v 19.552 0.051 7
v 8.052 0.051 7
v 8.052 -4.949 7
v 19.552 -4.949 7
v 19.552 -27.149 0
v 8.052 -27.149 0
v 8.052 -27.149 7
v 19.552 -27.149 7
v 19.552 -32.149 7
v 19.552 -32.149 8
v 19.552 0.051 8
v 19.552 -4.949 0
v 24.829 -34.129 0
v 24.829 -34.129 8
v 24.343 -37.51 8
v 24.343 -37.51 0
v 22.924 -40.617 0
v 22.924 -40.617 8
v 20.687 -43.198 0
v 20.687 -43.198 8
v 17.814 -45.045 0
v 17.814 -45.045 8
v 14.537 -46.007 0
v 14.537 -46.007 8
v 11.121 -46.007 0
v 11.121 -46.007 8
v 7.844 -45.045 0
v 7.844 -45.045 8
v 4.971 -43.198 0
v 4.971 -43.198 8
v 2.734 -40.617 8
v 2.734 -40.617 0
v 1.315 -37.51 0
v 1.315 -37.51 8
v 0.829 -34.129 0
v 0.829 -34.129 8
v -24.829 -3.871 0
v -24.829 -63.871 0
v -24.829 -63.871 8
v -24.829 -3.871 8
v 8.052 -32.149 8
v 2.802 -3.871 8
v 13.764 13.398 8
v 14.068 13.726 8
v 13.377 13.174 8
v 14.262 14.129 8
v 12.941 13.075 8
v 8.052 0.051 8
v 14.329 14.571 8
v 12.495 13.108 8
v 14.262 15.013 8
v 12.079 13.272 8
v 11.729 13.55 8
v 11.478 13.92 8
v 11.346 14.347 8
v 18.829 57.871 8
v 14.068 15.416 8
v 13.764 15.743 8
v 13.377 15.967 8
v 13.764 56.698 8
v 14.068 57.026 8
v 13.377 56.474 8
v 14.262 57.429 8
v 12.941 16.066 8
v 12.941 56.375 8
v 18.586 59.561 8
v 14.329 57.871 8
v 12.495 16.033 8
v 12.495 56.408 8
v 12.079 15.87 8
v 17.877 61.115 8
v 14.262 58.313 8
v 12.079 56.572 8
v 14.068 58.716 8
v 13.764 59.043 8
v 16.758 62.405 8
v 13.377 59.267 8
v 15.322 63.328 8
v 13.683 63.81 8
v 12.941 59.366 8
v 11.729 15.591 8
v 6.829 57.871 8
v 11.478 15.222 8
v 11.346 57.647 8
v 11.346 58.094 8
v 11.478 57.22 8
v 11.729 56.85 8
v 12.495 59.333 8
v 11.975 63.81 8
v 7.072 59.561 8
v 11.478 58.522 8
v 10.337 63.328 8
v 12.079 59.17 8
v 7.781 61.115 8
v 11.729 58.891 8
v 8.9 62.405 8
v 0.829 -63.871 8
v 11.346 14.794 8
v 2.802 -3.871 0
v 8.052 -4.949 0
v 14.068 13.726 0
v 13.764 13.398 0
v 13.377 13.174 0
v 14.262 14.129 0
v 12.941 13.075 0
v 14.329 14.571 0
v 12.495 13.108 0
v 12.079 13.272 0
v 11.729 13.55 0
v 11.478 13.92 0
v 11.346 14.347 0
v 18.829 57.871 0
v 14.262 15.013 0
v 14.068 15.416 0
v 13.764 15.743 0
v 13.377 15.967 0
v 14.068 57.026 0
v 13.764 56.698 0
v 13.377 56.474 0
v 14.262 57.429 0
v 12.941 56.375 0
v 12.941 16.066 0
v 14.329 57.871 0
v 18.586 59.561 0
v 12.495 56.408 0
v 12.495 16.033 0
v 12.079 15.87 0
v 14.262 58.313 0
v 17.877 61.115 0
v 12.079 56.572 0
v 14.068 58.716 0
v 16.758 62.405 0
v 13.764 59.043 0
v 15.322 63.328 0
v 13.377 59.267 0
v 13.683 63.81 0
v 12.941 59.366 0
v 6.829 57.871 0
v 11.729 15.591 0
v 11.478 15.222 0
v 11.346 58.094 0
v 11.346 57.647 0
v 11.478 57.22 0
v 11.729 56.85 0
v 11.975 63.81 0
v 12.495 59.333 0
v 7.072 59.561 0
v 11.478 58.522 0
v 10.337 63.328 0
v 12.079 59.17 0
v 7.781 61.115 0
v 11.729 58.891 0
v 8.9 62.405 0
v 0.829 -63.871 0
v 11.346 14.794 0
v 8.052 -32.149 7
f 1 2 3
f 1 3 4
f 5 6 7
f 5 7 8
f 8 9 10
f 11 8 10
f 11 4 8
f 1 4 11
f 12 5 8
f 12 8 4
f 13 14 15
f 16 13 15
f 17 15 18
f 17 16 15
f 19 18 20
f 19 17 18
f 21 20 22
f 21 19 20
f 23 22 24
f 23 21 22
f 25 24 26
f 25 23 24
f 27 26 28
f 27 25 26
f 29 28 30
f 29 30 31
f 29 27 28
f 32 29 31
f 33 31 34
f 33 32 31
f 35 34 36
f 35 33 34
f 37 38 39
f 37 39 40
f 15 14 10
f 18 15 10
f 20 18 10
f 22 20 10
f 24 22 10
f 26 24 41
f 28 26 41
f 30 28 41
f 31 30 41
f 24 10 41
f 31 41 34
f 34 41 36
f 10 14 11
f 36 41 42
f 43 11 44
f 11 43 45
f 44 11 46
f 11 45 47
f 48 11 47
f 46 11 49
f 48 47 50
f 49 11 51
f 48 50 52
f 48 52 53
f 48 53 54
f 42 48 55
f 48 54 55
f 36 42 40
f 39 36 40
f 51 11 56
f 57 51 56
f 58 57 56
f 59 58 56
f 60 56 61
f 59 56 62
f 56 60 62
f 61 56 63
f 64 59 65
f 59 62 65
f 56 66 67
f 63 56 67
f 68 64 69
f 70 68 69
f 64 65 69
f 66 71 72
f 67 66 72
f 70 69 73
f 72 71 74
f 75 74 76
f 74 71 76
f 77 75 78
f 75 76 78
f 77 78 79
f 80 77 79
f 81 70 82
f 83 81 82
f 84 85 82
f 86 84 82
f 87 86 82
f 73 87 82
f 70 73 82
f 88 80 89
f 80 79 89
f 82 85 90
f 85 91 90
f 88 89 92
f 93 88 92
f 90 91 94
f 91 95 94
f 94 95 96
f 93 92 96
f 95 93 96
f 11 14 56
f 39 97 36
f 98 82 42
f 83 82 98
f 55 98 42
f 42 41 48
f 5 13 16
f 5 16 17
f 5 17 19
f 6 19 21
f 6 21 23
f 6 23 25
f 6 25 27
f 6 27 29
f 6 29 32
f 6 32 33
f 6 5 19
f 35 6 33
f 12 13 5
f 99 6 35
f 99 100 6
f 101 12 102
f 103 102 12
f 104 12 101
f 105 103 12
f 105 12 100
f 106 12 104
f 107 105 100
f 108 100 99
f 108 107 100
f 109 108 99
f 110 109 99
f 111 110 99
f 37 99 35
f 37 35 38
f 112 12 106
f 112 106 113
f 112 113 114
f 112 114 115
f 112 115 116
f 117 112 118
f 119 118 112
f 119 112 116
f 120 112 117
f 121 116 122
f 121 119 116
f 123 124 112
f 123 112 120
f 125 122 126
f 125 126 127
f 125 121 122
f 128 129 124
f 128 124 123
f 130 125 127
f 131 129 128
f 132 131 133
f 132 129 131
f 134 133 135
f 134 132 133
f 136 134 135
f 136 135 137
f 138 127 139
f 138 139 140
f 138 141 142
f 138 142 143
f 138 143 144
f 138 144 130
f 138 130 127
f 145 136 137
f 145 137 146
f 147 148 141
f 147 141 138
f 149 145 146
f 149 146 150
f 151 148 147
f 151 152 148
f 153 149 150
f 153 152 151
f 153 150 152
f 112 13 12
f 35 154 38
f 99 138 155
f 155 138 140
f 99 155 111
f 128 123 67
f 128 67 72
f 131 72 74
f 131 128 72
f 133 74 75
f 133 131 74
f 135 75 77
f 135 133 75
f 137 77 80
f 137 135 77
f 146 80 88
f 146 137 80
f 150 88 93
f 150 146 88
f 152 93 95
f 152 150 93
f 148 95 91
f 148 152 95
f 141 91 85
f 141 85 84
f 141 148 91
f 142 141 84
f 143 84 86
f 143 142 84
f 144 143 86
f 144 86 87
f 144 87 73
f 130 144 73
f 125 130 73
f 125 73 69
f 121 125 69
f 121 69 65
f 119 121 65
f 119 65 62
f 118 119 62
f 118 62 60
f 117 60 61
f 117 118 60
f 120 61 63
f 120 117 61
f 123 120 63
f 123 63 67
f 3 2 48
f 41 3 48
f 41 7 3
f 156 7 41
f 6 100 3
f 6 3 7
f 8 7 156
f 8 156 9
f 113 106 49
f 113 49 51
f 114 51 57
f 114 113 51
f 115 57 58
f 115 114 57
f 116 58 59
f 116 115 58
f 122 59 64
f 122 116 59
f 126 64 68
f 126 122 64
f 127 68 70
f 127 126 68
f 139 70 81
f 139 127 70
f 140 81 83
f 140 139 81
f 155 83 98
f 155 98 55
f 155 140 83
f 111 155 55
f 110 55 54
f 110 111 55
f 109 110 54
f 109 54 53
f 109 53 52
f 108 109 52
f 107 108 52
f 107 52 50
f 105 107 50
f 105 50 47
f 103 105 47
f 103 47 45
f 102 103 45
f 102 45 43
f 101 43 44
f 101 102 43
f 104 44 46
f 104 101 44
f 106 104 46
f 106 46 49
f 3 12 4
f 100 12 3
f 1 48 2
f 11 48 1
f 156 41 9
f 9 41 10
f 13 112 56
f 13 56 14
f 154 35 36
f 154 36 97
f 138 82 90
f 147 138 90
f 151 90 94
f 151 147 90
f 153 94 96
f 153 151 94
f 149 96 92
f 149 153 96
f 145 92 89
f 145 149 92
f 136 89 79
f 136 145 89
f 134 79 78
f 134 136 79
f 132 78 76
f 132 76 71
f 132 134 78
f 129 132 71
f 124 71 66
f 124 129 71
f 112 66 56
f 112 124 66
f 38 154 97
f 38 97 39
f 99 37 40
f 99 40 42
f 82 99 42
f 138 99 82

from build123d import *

# Parameters (mm, degrees)
SKETCH1_R               = 1.5
BOSS_EXTRUDE1_DEPTH     = 8
CUT_EXTRUDE1_DEPTH      = 69.992355237
CUT_EXTRUDE1_DEPTH_BACK = 20
SKETCH2_W               = 11.5
SKETCH2_H               = 22.2
SKETCH2_3_W             = 11.5
SKETCH2_3_H             = 5
CUT_EXTRUDE2_DEPTH      = 1


with BuildPart() as part:
    # Sketch1 → Boss-Extrude1 (new body)
    with BuildSketch(Plane.XY):
        with BuildLine():
            Line((18.829016979, 57.870689655), (24.829016979, -34.129310345))
            ThreePointArc((24.829016979, -34.129310345), (12.829016979, -46.129310345), (0.829016979, -34.129310345))
            Line((0.829016979, -34.129310345), (0.829016979, -63.870689655))
            Line((0.829016979, -63.870689655), (-24.829016979, -63.870689655))
            Line((-24.829016979, -63.870689655), (-24.829016979, -3.870689655))
            Line((-24.829016979, -3.870689655), (2.802405285, -3.870689655))
            Line((2.802405285, -3.870689655), (6.829016979, 57.870689655))
            ThreePointArc((6.829016979, 57.870689655), (12.829016979, 63.870689655), (18.829016979, 57.870689655))
        make_face()
        with Locations((12.829016979, 57.870689655)):
            Circle(SKETCH1_R, mode=Mode.SUBTRACT)
        with Locations((12.829016979, 14.570689655)):
            Circle(SKETCH1_R, mode=Mode.SUBTRACT)
    extrude(amount=BOSS_EXTRUDE1_DEPTH)

    # Sketch2 → Cut-Extrude1 (cut, two sides: drawn at the far end of the back side and taken through both)
    with BuildSketch(Plane.XY.offset(8).offset(-CUT_EXTRUDE1_DEPTH_BACK)):
        with Locations((13.802405285, -16.049310345)):
            Rectangle(SKETCH2_W, SKETCH2_H)
    extrude(amount=CUT_EXTRUDE1_DEPTH + CUT_EXTRUDE1_DEPTH_BACK, mode=Mode.SUBTRACT)

    # Sketch2<3> → Cut-Extrude2 (cut)
    with BuildSketch(Plane.XY.offset(8)):
        with Locations((13.802405285, -2.449310345)):
            Rectangle(SKETCH2_3_W, SKETCH2_3_H)
        with Locations((13.802405285, -29.649310345)):
            Rectangle(SKETCH2_3_W, SKETCH2_3_H)
    extrude(amount=-CUT_EXTRUDE2_DEPTH, mode=Mode.SUBTRACT)


solid = part.part
